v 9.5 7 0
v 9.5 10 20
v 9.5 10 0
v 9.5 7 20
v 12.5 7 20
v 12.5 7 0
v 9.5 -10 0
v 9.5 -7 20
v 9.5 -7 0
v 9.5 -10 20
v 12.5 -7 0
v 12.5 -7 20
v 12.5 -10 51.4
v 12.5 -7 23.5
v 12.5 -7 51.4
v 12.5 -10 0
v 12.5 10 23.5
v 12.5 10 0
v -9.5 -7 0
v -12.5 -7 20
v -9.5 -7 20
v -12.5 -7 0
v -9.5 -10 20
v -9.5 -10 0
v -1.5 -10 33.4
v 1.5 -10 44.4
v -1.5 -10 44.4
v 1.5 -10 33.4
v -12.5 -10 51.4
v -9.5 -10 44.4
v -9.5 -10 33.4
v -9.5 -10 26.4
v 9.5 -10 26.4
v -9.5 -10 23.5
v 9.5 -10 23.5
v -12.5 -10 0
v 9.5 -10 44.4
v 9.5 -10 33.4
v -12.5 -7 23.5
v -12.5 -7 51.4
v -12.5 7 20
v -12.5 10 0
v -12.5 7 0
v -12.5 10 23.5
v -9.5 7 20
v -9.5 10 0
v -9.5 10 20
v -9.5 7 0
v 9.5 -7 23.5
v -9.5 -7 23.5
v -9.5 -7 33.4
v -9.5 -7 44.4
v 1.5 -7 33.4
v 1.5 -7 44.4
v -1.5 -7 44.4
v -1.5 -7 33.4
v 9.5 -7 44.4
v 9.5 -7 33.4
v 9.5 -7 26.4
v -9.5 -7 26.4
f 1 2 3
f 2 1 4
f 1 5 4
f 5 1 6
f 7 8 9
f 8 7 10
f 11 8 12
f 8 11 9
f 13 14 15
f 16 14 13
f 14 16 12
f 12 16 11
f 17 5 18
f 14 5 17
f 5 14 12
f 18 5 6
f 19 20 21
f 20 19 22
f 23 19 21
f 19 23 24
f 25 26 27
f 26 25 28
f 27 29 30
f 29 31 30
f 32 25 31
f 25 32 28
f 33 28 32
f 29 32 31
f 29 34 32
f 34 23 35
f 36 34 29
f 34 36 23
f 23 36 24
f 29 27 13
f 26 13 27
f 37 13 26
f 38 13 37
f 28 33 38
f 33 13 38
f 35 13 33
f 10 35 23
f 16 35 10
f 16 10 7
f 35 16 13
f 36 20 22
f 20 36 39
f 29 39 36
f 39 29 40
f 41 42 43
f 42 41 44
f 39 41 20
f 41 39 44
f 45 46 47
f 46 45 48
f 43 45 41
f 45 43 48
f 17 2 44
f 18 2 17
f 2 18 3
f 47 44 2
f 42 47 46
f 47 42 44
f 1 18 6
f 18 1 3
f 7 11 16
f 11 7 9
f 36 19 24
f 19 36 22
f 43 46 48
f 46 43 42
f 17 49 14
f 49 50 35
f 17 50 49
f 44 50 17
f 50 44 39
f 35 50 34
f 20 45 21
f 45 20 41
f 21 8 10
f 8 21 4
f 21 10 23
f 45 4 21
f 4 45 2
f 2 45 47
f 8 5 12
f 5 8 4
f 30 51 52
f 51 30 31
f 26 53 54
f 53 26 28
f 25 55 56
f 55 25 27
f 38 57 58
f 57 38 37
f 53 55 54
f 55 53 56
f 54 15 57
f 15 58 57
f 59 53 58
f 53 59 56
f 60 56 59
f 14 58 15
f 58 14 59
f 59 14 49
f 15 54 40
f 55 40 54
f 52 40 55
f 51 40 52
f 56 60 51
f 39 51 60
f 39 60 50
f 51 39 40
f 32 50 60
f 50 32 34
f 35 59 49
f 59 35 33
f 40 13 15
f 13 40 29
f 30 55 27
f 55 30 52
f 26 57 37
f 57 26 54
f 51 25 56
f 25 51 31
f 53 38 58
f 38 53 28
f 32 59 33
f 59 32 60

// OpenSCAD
length = 20;
width  =25;
depth = 3.5;;


cross =3;
leg_length =20;





echo(" length table is ", length, " mm");
 echo(" width table is ", width, " mm");
echo(" depth table top is ", depth, " mm");
 echo(" width table leg is ", cross, " mm");
 echo(" height table leg is ", leg_length, " mm");
 echo(" overall height table  is ", leg_length + depth, " mm");



overall_height = 25;
leg_len =3;
width_vertical_bar = 3;
width_horizontal_bar =7;

overall_width = width;
thickness =cross;





union()
{
translate([0,0,leg_length+depth])
rotate([180,0,0])
table();
translate([0,-l+thickness,hoh + leg_len + leg_length +  depth-0.1 ])
rotate([90,0,0])
chair_back();

}





l = length/2;
w = width/2;

how = overall_width/2;
hoh = overall_height/2;
ll = -hoh - leg_len;
wvb = width_vertical_bar;
whb = width_horizontal_bar;
hwvb = wvb/2;









module table()
{

/*
   polyhedron command
  by pmoews
*/
polyhedron
       (points = [
                 [ -w,  l, 0],
                 [ -w, -l, 0],
                 [  w, -l, 0],
                 [  w,  l, 0],
                 [ -w,  l,  depth],
                 [ -w, -l,  depth],
                 [  w, -l,  depth],
                 [  w,  l,  depth],
                 [  w-cross, -l,  depth],
                 [  w-cross, cross-l,  depth],
                 [  w, cross-l,  depth],
                 [  w, -l,  leg_length + depth],
                 [  w-cross, -l,  leg_length + depth],
                 [  w-cross, cross-l,  leg_length + depth],
                 [  w, cross-l,  leg_length + depth],
                 [  w,  l-cross,  depth],
                 [  w-cross,  l-cross,  depth],
                 [  w-cross,  l,  depth],
                 [  w,  l,  leg_length + depth],
                 [  w,  l-cross,  leg_length + depth],
                 [  w-cross,  l-cross,  leg_length + depth],
                 [  w-cross,  l,  leg_length + depth],
                 [ cross-w,  l,  depth],
                 [ cross-w,  l-cross,  depth],
                 [ -w,  l-cross,  depth],
                 [ -w,  l,  leg_length + depth],
                 [ cross-w,  l,  leg_length + depth],
                 [ cross-w,  l-cross,  leg_length + depth],
                 [ -w,  l-cross,  leg_length + depth],
                 [ -w, cross-l,  depth],
                 [ cross-w, cross-l,  depth],
                 [ cross-w, -l,  depth],
                 [ -w, -l,  leg_length + depth],
                 [ -w, cross-l,  leg_length + depth],
                 [ cross-w, cross-l,  leg_length + depth],
                 [ cross-w, -l,  leg_length + depth],
                ],
           triangles = [
                 [   14,   10,   11],[    6,   11,   10],
                 [   11,    6,   12],[    8,   12,    6],
                 [   12,    8,   13],[    9,   13,    8],
                 [   13,    9,   14],[    9,   10,   14],
                 [   17,   21,   16],[   20,   16,   21],
                 [   16,   20,   15],[   19,   15,   20],
                 [   15,   19,    7],[   18,    7,   19],
                 [    7,   18,   17],[   18,   21,   17],
                 [   24,   28,   23],[   27,   23,   28],
                 [   23,   27,   22],[   26,   22,   27],
                 [   22,   26,    4],[   25,    4,   26],
                 [    4,   25,   24],[   25,   28,   24],
                 [   31,   35,   30],[   34,   30,   35],
                 [   30,   34,   29],[   33,   29,   34],
                 [   29,   33,    5],[   32,    5,   33],
                 [    5,   32,   31],[   32,   35,   31],
                 [   13,   14,   11],[   13,   11,   12],
                 [   20,   21,   18],[   20,   18,   19],
                 [   27,   28,   25],[   27,   25,   26],
                 [   34,   35,   32],[   34,   32,   33],
                 [    2,    3,    0],[    2,    0,    1],
                 [   16,    9,   30],[   16,   30,   23],
                 [   10,    2,    6],[    7,    3,   15],
                 [   10,   15,    3],[   10,    3,    2],
                 [    7,   17,    3],[   22,    4,    0],
                 [    0,    3,   17],[    0,   17,   22],
                 [    4,   24,    0],[   29,    5,    1],
                 [    1,    0,   24],[    1,   24,   29],
                 [    5,   31,    1],[    8,    6,    2],
                 [    2,    1,   31],[    2,   31,    8],
                 [   10,    9,   16],[   10,   16,   15],
                 [   24,   23,   30],[   24,   30,   29],
                 [    9,    8,   31],[    9,   31,   30],
                 [   17,   16,   23],[   17,   23,   22],
                 ]
      );

}



module chair_back()
{


/*
   polyhedron command by
   pmoews
*/
polyhedron
       (points = [
                 [ -how, -hoh + whb,   0.0],
                 [ -how + wvb, -hoh + whb,   0.0],
                 [  -hwvb, -hoh + whb,   0.0],
                 [   hwvb, -hoh + whb,   0.0],
                 [  how - wvb, -hoh + whb,   0.0],
                 [  how, -hoh + whb,   0.0],
                 [  how,  hoh - whb,   0.0],
                 [  how - wvb,  hoh - whb,   0.0],
                 [   hwvb,  hoh - whb,   0.0],
                 [  -hwvb,  hoh - whb,   0.0],
                 [ -how + wvb,  hoh - whb,   0.0],
                 [ -how,  hoh - whb,   0.0],
                 [  how,  hoh,   0.0],
                 [  how - wvb,  hoh,   0.0],
                 [   hwvb,  hoh,   0.0],
                 [  -hwvb,  hoh,   0.0],
                 [ -how + wvb,  hoh,   0.0],
                 [ -how,  hoh,   0.0],
                 [ -how, -hoh,   0.0],
                 [ -how + wvb, -hoh,   0.0],
                 [  -hwvb, -hoh,   0.0],
                 [   hwvb, -hoh,   0.0],
                 [  how - wvb, -hoh,   0.0],
                 [  how, -hoh,   0.0],
                 [  how, ll,   0.0],
                 [  how - wvb, ll,   0.0],
                 [ -how + wvb, ll,   0.0],
                 [ -how, ll,   0.0],
                 [ -how, -hoh + whb,   thickness],
                 [ -how + wvb, -hoh + whb,   thickness],
                 [  -hwvb, -hoh + whb,   thickness],
                 [   hwvb, -hoh + whb,   thickness],
                 [  how - wvb, -hoh + whb,   thickness],
                 [  how, -hoh + whb,   thickness],
                 [  how,  hoh - whb,   thickness],
                 [  how - wvb,  hoh - whb,   thickness],
                 [   hwvb,  hoh - whb,   thickness],
                 [  -hwvb,  hoh - whb,   thickness],
                 [ -how + wvb,  hoh - whb,   thickness],
                 [ -how,  hoh - whb,   thickness],
                 [  how,  hoh,   thickness],
                 [  how - wvb,  hoh,   thickness],
                 [   hwvb,  hoh,   thickness],
                 [  -hwvb,  hoh,   thickness],
                 [ -how + wvb,  hoh,   thickness],
                 [ -how,  hoh,   thickness],
                 [ -how, -hoh,   thickness],
                 [ -how + wvb, -hoh,   thickness],
                 [  -hwvb, -hoh,   thickness],
                 [   hwvb, -hoh,   thickness],
                 [  how - wvb, -hoh,   thickness],
                 [  how, -hoh,   thickness],
                 [  how, ll,   thickness],
                 [  how - wvb, ll,   thickness],
                 [ -how + wvb, ll,   thickness],
                 [ -how, ll,   thickness],
                ],
           triangles = [
                 [   11,    0,   10],[    1,   10,    0],
                 [   10,    1,   38],[   29,   38,    1],
                 [   38,   29,   39],[   28,   39,   29],
                 [   39,   28,   11],[   28,    0,   11],
                 [    9,    2,    8],[    3,    8,    2],
                 [    8,    3,   36],[   31,   36,    3],
                 [   36,   31,   37],[   30,   37,   31],
                 [   37,   30,    9],[   30,    2,    9],
                 [    7,    4,    6],[    5,    6,    4],
                 [    6,    5,   34],[   33,   34,    5],
                 [   34,   33,   35],[   32,   35,   33],
                 [   35,   32,    7],[   32,    4,    7],
                 [   18,   27,   19],[   26,   19,   27],
                 [   19,   26,   47],[   54,   47,   26],
                 [   47,   54,   46],[   55,   46,   54],
                 [   46,   55,   18],[   55,   27,   18],
                 [   22,   25,   23],[   24,   23,   25],
                 [   23,   24,   51],[   52,   51,   24],
                 [   51,   52,   50],[   53,   50,   52],
                 [   50,   53,   22],[   53,   25,   22],
                 [   24,   25,   53],[   24,   53,   52],
                 [   26,   27,   55],[   26,   55,   54],
                 [   16,   17,   11],[   16,   11,   10],
                 [   15,   16,   10],[   15,   10,    9],
                 [   14,   15,    9],[   14,    9,    8],
                 [   13,   14,    8],[   13,    8,    7],
                 [   12,   13,    7],[   12,    7,    6],
                 [   38,   39,   45],[   38,   45,   44],
                 [   37,   38,   44],[   37,   44,   43],
                 [   36,   37,   43],[   36,   43,   42],
                 [   35,   36,   42],[   35,   42,   41],
                 [   34,   35,   41],[   34,   41,   40],
                 [    1,    0,   18],[    1,   18,   19],
                 [    2,    1,   19],[    2,   19,   20],
                 [    3,    2,   20],[    3,   20,   21],
                 [    4,    3,   21],[    4,   21,   22],
                 [    5,    4,   22],[    5,   22,   23],
                 [   47,   46,   28],[   47,   28,   29],
                 [   48,   47,   29],[   48,   29,   30],
                 [   49,   48,   30],[   49,   30,   31],
                 [   50,   49,   31],[   50,   31,   32],
                 [   51,   50,   32],[   51,   32,   33],
                 [   45,   17,   16],[   45,   16,   44],
                 [   44,   16,   15],[   44,   15,   43],
                 [   43,   15,   14],[   43,   14,   42],
                 [   42,   14,   13],[   42,   13,   41],
                 [   41,   13,   12],[   41,   12,   40],
                 [   11,   17,   45],[   11,   45,   39],
                 [   12,    6,   34],[   12,   34,   40],
                 [    9,   10,   38],[    9,   38,   37],
                 [    7,    8,   36],[    7,   36,   35],
                 [   18,    0,   28],[   18,   28,   46],
                 [   23,   51,   33],[   23,   33,    5],
                 [   30,   29,    1],[   30,    1,    2],
                 [   32,   31,    3],[   32,    3,    4],
                 [   20,   19,   47],[   20,   47,   48],
                 [   22,   21,   49],[   22,   49,   50],
                 [   21,   20,   48],[   21,   48,   49],
                 ]                   );
}
